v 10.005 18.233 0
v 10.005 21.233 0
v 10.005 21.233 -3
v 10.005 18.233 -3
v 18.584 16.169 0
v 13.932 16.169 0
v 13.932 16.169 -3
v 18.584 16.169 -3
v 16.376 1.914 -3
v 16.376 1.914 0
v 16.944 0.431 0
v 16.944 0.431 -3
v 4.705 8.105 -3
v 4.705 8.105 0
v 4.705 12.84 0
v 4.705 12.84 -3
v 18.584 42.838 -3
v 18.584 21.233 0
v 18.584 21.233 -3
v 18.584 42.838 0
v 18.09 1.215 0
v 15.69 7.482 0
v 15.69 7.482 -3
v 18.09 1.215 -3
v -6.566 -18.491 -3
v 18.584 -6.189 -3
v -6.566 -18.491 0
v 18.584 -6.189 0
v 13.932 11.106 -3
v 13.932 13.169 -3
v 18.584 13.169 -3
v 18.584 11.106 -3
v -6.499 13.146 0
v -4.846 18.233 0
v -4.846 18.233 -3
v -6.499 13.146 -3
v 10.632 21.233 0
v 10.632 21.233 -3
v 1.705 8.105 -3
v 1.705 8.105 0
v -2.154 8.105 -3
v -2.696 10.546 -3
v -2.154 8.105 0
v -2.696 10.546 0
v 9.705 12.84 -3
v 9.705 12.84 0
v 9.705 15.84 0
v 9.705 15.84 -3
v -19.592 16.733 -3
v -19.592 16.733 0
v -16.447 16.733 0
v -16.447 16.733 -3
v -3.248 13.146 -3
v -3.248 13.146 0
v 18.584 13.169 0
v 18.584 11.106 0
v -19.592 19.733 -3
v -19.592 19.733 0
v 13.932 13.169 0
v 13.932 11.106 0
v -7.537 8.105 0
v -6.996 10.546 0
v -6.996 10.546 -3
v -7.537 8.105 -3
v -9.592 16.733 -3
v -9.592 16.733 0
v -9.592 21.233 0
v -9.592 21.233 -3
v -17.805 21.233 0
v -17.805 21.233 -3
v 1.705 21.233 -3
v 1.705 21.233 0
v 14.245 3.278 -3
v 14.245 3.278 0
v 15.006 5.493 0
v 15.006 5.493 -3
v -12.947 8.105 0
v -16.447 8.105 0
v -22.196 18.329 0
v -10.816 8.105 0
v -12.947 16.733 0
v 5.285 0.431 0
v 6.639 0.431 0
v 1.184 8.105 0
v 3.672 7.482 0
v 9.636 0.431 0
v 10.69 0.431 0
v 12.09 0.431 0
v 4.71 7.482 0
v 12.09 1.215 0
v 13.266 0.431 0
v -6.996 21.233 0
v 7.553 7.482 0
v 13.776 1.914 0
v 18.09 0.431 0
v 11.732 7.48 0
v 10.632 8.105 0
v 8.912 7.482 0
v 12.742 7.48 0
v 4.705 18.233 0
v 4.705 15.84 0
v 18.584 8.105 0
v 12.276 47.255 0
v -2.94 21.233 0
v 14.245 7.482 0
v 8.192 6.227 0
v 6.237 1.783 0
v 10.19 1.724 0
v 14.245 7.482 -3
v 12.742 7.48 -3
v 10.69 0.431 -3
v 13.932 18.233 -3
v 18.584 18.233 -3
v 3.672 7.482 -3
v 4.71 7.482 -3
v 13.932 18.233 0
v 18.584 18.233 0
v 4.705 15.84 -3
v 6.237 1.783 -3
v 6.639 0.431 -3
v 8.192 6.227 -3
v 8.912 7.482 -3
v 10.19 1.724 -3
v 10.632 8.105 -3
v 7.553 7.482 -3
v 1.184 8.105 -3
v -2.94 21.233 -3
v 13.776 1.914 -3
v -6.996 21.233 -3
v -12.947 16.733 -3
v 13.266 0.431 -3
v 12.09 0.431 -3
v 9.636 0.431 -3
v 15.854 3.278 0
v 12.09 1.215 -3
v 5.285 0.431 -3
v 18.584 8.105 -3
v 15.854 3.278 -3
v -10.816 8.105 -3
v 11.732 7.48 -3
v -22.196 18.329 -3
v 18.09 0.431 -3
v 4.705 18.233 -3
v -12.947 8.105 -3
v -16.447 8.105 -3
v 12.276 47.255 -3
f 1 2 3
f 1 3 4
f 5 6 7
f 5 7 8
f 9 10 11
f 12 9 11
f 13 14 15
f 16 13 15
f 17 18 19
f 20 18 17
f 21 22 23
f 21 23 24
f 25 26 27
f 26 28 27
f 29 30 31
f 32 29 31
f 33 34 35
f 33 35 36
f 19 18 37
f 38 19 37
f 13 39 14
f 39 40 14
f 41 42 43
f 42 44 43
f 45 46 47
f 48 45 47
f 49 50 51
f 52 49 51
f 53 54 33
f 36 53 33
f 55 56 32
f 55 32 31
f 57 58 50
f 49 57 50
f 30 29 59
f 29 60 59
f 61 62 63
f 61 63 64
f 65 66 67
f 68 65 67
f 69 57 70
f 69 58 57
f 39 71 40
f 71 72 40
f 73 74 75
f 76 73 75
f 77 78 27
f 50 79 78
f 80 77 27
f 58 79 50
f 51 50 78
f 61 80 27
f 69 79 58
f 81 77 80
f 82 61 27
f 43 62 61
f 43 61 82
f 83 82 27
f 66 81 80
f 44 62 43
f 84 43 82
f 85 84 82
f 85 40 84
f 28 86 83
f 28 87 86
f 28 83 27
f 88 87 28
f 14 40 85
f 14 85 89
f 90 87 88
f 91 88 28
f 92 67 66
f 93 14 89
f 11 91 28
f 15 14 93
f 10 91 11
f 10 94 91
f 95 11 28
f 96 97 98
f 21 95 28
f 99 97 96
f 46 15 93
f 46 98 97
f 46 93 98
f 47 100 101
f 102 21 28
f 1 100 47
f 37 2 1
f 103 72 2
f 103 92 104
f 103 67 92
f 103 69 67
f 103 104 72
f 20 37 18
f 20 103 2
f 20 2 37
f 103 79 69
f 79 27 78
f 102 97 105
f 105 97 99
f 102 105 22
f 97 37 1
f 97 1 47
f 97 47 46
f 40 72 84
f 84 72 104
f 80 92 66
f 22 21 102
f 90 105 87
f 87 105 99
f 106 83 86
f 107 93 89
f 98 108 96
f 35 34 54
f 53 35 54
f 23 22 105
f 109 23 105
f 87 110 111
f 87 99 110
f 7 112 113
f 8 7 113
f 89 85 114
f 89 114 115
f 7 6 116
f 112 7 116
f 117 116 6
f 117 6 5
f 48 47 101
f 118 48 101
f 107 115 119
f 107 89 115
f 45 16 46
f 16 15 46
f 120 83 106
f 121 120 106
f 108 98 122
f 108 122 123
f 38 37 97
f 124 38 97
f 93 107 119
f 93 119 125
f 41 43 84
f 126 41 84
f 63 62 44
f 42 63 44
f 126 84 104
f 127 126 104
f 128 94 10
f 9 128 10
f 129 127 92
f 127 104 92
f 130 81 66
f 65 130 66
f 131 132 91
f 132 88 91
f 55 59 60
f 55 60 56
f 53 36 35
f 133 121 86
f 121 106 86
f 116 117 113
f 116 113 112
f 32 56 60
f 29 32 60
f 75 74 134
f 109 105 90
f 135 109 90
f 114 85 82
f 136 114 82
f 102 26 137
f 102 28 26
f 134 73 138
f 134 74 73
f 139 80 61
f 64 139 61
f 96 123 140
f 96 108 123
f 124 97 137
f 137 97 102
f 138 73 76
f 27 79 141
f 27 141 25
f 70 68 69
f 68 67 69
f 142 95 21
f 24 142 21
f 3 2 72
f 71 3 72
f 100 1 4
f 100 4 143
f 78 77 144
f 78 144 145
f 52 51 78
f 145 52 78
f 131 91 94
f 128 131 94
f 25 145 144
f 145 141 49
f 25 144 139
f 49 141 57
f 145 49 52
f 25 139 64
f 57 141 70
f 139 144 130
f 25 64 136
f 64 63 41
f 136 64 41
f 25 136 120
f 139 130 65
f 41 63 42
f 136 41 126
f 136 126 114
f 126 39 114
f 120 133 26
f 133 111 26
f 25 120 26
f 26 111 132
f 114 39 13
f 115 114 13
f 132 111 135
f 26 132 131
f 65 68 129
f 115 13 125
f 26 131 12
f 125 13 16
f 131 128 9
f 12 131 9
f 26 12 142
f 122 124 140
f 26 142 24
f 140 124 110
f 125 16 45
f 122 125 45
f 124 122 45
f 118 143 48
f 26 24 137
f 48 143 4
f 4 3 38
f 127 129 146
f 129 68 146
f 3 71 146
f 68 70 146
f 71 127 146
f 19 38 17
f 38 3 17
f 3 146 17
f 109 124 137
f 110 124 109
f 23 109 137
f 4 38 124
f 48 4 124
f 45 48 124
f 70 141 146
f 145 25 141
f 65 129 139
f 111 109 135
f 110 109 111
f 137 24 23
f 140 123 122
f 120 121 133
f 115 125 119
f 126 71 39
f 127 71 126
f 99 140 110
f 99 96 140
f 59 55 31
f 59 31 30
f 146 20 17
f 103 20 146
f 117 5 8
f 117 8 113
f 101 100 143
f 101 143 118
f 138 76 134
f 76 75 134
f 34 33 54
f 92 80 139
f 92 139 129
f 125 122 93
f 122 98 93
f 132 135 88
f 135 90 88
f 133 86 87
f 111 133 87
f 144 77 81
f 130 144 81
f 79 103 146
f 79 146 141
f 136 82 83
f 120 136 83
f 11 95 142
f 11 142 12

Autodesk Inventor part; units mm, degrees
ref_plane "YZ Plane" through (0, 0, 0) normal (1, 0, 0) x (0, 1, 0)
ref_plane "XZ Plane" through (0, 0, 0) normal (0, 1, 0) x (-1, 0, 0)
ref_plane "XY Plane" through (0, 0, 0) normal (0, 0, 1) x (1, 0, 0)
sketch "Sketch1" plane through (0, 0, 0) normal (0, 0, 1) x (1, 0, 0)
  line L0 (18.5838, -6.189) -> (18.5838, 42.8381)
  line L1 (18.5838, 42.8381) -> (12.2763, 47.2547)
  line L2 (12.2763, 47.2547) -> (-22.1957, 18.3292)
  line L3 (-22.1957, 18.3292) -> (-6.5665, -18.491)
  line L4 (18.5838, -6.189) -> (-6.5665, -18.491)
  point P0 (0, 0)
  dimension "d69" = 125
  dimension "d70" = 116.065
  dimension "d71" = 50
  dimension "d72" = 23
  dimension "d73" = 18.5838
  dimension "d74" = 45.7502
  dimension "d75" = 13.7251
  dimension "d76" = 28.3081
  dimension "d77" = 13.2695
sketch "Sketch2" plane through (0, 0, 0) normal (0, 0, 1) x (1, 0, 0)
  line L0 (-9.5924, 21.2326) -> (-17.8048, 21.2326)
  line L1 (-19.5924, 19.7326) -> (-19.5924, 16.7326)
  line L2 (-9.5924, 16.7326) -> (-9.5924, 21.2326)
  line L3 (-12.947, 8.1055) -> (-12.947, 16.7326)
  line L4 (-12.947, 21.2326) -> (-16.447, 21.2326)
  line L5 (-16.447, 16.7326) -> (-16.447, 8.1055)
  line L6 (-19.5924, 16.7326) -> (-16.447, 16.7326)
  line L7 (-12.947, 16.7326) -> (-9.5924, 16.7326)
  line L8 (-6.9955, 10.5461) -> (-2.6955, 10.5461)
  line L9 (-3.2476, 13.1461) -> (-6.4988, 13.1461)
  line L10 (-6.9955, 10.5461) -> (-7.5373, 8.1055)
  line L11 (-2.6955, 10.5461) -> (-2.1538, 8.1055)
  line L12 (1.1842, 8.1055) -> (-2.9398, 21.2326)
  line L13 (-10.8158, 8.1055) -> (-6.9955, 21.2326)
  line L14 (-4.8455, 18.2326) -> (-6.4988, 13.1461)
  line L15 (-4.8455, 18.2326) -> (-3.2476, 13.1461)
  line L16 (-2.9398, 21.2326) -> (-6.9955, 21.2326)
  line L17 (-9.5924, 21.2326) -> (-10.8158, 21.2326)
  line L18 (-10.8158, 8.1055) -> (-7.5373, 8.1055)
  line L19 (-2.1538, 8.1055) -> (1.1842, 8.1055)
  line L20 (1.7053, 8.1055) -> (4.7053, 8.1055)
  line L21 (4.7053, 21.2326) -> (1.7053, 21.2326)
  line L22 (1.7053, 21.2326) -> (1.7053, 8.1055)
  line L23 (4.7053, 21.2326) -> (10.0053, 21.2326)
  line L24 (10.0053, 21.2326) -> (10.0053, 18.2326)
  line L25 (10.0053, 18.2326) -> (4.7053, 18.2326)
  line L26 (4.7053, 12.8401) -> (9.7053, 12.8401)
  line L27 (9.7053, 12.8401) -> (9.7053, 15.8401)
  line L28 (9.7053, 15.8401) -> (4.7053, 15.8401)
  line L29 (4.7053, 8.1055) -> (4.7053, 12.8401)
  line L30 (4.7053, 18.2326) -> (4.7053, 15.8401)
  line L31 (10.6316, 8.1055) -> (13.9316, 8.1055)
  line L32 (13.9316, 21.2326) -> (10.6316, 21.2326)
  line L33 (10.6316, 21.2326) -> (10.6316, 8.1055)
  line L34 (10.6316, 21.2326) -> (18.5838, 21.2326)
  line L35 (18.5838, 21.2326) -> (18.5838, 18.2326)
  line L36 (18.5838, 18.2326) -> (13.9316, 18.2326)
  line L37 (10.6316, 18.2326) -> (10.6316, 21.2326)
  line L38 (10.6316, 8.1055) -> (18.5838, 8.1055)
  line L39 (18.5838, 8.1055) -> (18.5838, 11.1055)
  line L40 (18.5838, 11.1055) -> (13.9316, 11.1055)
  line L41 (10.6316, 11.1055) -> (10.6316, 8.1055)
  line L42 (18.5838, 13.169) -> (13.9316, 13.169)
  line L43 (10.6316, 13.169) -> (10.6316, 16.169)
  line L44 (13.9316, 16.169) -> (18.5838, 16.169)
  line L45 (18.5838, 16.169) -> (18.5838, 13.169)
  line L46 (13.9316, 11.1055) -> (13.9316, 13.169)
  line L47 (13.9316, 16.169) -> (13.9316, 18.2326)
  line L48 (4.7101, 7.4818) -> (6.2371, 1.7828)
  line L49 (4.7101, 7.4818) -> (10.6101, 7.4818) construction
  line L50 (6.2371, 1.7828) -> (7.5531, 7.4818)
  line L51 (6.6393, 0.4313) -> (8.1922, 6.2269)
  line L52 (6.6393, 0.4313) -> (12.6393, 0.4313) construction
  line L53 (8.1922, 6.2269) -> (9.6357, 0.4313)
  line L54 (8.9116, 7.4818) -> (10.1897, 1.7237)
  line L55 (10.1897, 1.7237) -> (11.7321, 7.4799)
  line L56 (5.2852, 0.4313) -> (6.6393, 0.4313)
  line L57 (12.7416, 7.4799) -> (10.6898, 0.4313)
  line L58 (9.6357, 0.4313) -> (10.6898, 0.4313)
  line L59 (8.9116, 7.4818) -> (7.5531, 7.4818)
  line L60 (11.7321, 7.4799) -> (12.7416, 7.4799)
  line L61 (3.6715, 7.4818) -> (4.7101, 7.4818)
  line L62 (3.6715, 7.4818) -> (5.2852, 0.4313)
  line L63 (18.0899, 0.4313) -> (18.0899, 1.2146)
  line L64 (15.6901, 7.4818) -> (14.2447, 7.4818)
  line L65 (14.2447, 7.4818) -> (15.6901, 7.4818)
  line L66 (18.0899, 1.2146) -> (18.0899, 0.4313)
  line L67 (18.0899, 0.4313) -> (16.9444, 0.4313)
  line L68 (14.2447, 7.4818) -> (12.0899, 1.2146)
  line L69 (15.6901, 7.4818) -> (18.0899, 1.2146)
  line L70 (14.2447, 3.278) -> (15.8544, 3.278)
  line L71 (13.7758, 1.9143) -> (16.3765, 1.9143)
  line L72 (13.2659, 0.4313) -> (13.7758, 1.9143)
  line L73 (14.2447, 3.278) -> (15.0062, 5.4929)
  line L74 (15.0062, 5.4929) -> (15.8544, 3.278)
  line L75 (16.3765, 1.9143) -> (16.9444, 0.4313)
  line L76 (12.0899, 0.4313) -> (13.2659, 0.4313)
  line L77 (16.9444, 0.4313) -> (18.0899, 0.4313)
  line L78 (12.0899, 1.2146) -> (12.0899, 0.4313)
  line L79 (-19.5924, 19.7326) -> (-17.8048, 21.2326)
  line L80 (-19.5924, 19.7326) -> (-17.2589, 19.7326) construction
  line L81 (-12.947, 8.1055) -> (-16.447, 8.1055)
  point P0 (0, 0)
  dimension "d39" = 3
  dimension "d41" = 12
  dimension "d44" = 2.5
  dimension "d45" = 2.5
  dimension "d46" = 3
  dimension "d47" = 5.3
  dimension "d48" = 5
  dimension "d49" = 3
  dimension "d50" = 3.3
  dimension "d51" = 3
  dimension "d52" = 3
  dimension "d55" = 5.9
  dimension "d56" = 75
  dimension "d57" = 6
  dimension "d58" = 75
  dimension "d62" = 40
extrude "Extrusion1" add sketch "Sketch1" against normal blind 3
extrude "Extrusion2" cut sketch "Sketch2" against normal blind 3
properties part number "Tage logo 2,0"
